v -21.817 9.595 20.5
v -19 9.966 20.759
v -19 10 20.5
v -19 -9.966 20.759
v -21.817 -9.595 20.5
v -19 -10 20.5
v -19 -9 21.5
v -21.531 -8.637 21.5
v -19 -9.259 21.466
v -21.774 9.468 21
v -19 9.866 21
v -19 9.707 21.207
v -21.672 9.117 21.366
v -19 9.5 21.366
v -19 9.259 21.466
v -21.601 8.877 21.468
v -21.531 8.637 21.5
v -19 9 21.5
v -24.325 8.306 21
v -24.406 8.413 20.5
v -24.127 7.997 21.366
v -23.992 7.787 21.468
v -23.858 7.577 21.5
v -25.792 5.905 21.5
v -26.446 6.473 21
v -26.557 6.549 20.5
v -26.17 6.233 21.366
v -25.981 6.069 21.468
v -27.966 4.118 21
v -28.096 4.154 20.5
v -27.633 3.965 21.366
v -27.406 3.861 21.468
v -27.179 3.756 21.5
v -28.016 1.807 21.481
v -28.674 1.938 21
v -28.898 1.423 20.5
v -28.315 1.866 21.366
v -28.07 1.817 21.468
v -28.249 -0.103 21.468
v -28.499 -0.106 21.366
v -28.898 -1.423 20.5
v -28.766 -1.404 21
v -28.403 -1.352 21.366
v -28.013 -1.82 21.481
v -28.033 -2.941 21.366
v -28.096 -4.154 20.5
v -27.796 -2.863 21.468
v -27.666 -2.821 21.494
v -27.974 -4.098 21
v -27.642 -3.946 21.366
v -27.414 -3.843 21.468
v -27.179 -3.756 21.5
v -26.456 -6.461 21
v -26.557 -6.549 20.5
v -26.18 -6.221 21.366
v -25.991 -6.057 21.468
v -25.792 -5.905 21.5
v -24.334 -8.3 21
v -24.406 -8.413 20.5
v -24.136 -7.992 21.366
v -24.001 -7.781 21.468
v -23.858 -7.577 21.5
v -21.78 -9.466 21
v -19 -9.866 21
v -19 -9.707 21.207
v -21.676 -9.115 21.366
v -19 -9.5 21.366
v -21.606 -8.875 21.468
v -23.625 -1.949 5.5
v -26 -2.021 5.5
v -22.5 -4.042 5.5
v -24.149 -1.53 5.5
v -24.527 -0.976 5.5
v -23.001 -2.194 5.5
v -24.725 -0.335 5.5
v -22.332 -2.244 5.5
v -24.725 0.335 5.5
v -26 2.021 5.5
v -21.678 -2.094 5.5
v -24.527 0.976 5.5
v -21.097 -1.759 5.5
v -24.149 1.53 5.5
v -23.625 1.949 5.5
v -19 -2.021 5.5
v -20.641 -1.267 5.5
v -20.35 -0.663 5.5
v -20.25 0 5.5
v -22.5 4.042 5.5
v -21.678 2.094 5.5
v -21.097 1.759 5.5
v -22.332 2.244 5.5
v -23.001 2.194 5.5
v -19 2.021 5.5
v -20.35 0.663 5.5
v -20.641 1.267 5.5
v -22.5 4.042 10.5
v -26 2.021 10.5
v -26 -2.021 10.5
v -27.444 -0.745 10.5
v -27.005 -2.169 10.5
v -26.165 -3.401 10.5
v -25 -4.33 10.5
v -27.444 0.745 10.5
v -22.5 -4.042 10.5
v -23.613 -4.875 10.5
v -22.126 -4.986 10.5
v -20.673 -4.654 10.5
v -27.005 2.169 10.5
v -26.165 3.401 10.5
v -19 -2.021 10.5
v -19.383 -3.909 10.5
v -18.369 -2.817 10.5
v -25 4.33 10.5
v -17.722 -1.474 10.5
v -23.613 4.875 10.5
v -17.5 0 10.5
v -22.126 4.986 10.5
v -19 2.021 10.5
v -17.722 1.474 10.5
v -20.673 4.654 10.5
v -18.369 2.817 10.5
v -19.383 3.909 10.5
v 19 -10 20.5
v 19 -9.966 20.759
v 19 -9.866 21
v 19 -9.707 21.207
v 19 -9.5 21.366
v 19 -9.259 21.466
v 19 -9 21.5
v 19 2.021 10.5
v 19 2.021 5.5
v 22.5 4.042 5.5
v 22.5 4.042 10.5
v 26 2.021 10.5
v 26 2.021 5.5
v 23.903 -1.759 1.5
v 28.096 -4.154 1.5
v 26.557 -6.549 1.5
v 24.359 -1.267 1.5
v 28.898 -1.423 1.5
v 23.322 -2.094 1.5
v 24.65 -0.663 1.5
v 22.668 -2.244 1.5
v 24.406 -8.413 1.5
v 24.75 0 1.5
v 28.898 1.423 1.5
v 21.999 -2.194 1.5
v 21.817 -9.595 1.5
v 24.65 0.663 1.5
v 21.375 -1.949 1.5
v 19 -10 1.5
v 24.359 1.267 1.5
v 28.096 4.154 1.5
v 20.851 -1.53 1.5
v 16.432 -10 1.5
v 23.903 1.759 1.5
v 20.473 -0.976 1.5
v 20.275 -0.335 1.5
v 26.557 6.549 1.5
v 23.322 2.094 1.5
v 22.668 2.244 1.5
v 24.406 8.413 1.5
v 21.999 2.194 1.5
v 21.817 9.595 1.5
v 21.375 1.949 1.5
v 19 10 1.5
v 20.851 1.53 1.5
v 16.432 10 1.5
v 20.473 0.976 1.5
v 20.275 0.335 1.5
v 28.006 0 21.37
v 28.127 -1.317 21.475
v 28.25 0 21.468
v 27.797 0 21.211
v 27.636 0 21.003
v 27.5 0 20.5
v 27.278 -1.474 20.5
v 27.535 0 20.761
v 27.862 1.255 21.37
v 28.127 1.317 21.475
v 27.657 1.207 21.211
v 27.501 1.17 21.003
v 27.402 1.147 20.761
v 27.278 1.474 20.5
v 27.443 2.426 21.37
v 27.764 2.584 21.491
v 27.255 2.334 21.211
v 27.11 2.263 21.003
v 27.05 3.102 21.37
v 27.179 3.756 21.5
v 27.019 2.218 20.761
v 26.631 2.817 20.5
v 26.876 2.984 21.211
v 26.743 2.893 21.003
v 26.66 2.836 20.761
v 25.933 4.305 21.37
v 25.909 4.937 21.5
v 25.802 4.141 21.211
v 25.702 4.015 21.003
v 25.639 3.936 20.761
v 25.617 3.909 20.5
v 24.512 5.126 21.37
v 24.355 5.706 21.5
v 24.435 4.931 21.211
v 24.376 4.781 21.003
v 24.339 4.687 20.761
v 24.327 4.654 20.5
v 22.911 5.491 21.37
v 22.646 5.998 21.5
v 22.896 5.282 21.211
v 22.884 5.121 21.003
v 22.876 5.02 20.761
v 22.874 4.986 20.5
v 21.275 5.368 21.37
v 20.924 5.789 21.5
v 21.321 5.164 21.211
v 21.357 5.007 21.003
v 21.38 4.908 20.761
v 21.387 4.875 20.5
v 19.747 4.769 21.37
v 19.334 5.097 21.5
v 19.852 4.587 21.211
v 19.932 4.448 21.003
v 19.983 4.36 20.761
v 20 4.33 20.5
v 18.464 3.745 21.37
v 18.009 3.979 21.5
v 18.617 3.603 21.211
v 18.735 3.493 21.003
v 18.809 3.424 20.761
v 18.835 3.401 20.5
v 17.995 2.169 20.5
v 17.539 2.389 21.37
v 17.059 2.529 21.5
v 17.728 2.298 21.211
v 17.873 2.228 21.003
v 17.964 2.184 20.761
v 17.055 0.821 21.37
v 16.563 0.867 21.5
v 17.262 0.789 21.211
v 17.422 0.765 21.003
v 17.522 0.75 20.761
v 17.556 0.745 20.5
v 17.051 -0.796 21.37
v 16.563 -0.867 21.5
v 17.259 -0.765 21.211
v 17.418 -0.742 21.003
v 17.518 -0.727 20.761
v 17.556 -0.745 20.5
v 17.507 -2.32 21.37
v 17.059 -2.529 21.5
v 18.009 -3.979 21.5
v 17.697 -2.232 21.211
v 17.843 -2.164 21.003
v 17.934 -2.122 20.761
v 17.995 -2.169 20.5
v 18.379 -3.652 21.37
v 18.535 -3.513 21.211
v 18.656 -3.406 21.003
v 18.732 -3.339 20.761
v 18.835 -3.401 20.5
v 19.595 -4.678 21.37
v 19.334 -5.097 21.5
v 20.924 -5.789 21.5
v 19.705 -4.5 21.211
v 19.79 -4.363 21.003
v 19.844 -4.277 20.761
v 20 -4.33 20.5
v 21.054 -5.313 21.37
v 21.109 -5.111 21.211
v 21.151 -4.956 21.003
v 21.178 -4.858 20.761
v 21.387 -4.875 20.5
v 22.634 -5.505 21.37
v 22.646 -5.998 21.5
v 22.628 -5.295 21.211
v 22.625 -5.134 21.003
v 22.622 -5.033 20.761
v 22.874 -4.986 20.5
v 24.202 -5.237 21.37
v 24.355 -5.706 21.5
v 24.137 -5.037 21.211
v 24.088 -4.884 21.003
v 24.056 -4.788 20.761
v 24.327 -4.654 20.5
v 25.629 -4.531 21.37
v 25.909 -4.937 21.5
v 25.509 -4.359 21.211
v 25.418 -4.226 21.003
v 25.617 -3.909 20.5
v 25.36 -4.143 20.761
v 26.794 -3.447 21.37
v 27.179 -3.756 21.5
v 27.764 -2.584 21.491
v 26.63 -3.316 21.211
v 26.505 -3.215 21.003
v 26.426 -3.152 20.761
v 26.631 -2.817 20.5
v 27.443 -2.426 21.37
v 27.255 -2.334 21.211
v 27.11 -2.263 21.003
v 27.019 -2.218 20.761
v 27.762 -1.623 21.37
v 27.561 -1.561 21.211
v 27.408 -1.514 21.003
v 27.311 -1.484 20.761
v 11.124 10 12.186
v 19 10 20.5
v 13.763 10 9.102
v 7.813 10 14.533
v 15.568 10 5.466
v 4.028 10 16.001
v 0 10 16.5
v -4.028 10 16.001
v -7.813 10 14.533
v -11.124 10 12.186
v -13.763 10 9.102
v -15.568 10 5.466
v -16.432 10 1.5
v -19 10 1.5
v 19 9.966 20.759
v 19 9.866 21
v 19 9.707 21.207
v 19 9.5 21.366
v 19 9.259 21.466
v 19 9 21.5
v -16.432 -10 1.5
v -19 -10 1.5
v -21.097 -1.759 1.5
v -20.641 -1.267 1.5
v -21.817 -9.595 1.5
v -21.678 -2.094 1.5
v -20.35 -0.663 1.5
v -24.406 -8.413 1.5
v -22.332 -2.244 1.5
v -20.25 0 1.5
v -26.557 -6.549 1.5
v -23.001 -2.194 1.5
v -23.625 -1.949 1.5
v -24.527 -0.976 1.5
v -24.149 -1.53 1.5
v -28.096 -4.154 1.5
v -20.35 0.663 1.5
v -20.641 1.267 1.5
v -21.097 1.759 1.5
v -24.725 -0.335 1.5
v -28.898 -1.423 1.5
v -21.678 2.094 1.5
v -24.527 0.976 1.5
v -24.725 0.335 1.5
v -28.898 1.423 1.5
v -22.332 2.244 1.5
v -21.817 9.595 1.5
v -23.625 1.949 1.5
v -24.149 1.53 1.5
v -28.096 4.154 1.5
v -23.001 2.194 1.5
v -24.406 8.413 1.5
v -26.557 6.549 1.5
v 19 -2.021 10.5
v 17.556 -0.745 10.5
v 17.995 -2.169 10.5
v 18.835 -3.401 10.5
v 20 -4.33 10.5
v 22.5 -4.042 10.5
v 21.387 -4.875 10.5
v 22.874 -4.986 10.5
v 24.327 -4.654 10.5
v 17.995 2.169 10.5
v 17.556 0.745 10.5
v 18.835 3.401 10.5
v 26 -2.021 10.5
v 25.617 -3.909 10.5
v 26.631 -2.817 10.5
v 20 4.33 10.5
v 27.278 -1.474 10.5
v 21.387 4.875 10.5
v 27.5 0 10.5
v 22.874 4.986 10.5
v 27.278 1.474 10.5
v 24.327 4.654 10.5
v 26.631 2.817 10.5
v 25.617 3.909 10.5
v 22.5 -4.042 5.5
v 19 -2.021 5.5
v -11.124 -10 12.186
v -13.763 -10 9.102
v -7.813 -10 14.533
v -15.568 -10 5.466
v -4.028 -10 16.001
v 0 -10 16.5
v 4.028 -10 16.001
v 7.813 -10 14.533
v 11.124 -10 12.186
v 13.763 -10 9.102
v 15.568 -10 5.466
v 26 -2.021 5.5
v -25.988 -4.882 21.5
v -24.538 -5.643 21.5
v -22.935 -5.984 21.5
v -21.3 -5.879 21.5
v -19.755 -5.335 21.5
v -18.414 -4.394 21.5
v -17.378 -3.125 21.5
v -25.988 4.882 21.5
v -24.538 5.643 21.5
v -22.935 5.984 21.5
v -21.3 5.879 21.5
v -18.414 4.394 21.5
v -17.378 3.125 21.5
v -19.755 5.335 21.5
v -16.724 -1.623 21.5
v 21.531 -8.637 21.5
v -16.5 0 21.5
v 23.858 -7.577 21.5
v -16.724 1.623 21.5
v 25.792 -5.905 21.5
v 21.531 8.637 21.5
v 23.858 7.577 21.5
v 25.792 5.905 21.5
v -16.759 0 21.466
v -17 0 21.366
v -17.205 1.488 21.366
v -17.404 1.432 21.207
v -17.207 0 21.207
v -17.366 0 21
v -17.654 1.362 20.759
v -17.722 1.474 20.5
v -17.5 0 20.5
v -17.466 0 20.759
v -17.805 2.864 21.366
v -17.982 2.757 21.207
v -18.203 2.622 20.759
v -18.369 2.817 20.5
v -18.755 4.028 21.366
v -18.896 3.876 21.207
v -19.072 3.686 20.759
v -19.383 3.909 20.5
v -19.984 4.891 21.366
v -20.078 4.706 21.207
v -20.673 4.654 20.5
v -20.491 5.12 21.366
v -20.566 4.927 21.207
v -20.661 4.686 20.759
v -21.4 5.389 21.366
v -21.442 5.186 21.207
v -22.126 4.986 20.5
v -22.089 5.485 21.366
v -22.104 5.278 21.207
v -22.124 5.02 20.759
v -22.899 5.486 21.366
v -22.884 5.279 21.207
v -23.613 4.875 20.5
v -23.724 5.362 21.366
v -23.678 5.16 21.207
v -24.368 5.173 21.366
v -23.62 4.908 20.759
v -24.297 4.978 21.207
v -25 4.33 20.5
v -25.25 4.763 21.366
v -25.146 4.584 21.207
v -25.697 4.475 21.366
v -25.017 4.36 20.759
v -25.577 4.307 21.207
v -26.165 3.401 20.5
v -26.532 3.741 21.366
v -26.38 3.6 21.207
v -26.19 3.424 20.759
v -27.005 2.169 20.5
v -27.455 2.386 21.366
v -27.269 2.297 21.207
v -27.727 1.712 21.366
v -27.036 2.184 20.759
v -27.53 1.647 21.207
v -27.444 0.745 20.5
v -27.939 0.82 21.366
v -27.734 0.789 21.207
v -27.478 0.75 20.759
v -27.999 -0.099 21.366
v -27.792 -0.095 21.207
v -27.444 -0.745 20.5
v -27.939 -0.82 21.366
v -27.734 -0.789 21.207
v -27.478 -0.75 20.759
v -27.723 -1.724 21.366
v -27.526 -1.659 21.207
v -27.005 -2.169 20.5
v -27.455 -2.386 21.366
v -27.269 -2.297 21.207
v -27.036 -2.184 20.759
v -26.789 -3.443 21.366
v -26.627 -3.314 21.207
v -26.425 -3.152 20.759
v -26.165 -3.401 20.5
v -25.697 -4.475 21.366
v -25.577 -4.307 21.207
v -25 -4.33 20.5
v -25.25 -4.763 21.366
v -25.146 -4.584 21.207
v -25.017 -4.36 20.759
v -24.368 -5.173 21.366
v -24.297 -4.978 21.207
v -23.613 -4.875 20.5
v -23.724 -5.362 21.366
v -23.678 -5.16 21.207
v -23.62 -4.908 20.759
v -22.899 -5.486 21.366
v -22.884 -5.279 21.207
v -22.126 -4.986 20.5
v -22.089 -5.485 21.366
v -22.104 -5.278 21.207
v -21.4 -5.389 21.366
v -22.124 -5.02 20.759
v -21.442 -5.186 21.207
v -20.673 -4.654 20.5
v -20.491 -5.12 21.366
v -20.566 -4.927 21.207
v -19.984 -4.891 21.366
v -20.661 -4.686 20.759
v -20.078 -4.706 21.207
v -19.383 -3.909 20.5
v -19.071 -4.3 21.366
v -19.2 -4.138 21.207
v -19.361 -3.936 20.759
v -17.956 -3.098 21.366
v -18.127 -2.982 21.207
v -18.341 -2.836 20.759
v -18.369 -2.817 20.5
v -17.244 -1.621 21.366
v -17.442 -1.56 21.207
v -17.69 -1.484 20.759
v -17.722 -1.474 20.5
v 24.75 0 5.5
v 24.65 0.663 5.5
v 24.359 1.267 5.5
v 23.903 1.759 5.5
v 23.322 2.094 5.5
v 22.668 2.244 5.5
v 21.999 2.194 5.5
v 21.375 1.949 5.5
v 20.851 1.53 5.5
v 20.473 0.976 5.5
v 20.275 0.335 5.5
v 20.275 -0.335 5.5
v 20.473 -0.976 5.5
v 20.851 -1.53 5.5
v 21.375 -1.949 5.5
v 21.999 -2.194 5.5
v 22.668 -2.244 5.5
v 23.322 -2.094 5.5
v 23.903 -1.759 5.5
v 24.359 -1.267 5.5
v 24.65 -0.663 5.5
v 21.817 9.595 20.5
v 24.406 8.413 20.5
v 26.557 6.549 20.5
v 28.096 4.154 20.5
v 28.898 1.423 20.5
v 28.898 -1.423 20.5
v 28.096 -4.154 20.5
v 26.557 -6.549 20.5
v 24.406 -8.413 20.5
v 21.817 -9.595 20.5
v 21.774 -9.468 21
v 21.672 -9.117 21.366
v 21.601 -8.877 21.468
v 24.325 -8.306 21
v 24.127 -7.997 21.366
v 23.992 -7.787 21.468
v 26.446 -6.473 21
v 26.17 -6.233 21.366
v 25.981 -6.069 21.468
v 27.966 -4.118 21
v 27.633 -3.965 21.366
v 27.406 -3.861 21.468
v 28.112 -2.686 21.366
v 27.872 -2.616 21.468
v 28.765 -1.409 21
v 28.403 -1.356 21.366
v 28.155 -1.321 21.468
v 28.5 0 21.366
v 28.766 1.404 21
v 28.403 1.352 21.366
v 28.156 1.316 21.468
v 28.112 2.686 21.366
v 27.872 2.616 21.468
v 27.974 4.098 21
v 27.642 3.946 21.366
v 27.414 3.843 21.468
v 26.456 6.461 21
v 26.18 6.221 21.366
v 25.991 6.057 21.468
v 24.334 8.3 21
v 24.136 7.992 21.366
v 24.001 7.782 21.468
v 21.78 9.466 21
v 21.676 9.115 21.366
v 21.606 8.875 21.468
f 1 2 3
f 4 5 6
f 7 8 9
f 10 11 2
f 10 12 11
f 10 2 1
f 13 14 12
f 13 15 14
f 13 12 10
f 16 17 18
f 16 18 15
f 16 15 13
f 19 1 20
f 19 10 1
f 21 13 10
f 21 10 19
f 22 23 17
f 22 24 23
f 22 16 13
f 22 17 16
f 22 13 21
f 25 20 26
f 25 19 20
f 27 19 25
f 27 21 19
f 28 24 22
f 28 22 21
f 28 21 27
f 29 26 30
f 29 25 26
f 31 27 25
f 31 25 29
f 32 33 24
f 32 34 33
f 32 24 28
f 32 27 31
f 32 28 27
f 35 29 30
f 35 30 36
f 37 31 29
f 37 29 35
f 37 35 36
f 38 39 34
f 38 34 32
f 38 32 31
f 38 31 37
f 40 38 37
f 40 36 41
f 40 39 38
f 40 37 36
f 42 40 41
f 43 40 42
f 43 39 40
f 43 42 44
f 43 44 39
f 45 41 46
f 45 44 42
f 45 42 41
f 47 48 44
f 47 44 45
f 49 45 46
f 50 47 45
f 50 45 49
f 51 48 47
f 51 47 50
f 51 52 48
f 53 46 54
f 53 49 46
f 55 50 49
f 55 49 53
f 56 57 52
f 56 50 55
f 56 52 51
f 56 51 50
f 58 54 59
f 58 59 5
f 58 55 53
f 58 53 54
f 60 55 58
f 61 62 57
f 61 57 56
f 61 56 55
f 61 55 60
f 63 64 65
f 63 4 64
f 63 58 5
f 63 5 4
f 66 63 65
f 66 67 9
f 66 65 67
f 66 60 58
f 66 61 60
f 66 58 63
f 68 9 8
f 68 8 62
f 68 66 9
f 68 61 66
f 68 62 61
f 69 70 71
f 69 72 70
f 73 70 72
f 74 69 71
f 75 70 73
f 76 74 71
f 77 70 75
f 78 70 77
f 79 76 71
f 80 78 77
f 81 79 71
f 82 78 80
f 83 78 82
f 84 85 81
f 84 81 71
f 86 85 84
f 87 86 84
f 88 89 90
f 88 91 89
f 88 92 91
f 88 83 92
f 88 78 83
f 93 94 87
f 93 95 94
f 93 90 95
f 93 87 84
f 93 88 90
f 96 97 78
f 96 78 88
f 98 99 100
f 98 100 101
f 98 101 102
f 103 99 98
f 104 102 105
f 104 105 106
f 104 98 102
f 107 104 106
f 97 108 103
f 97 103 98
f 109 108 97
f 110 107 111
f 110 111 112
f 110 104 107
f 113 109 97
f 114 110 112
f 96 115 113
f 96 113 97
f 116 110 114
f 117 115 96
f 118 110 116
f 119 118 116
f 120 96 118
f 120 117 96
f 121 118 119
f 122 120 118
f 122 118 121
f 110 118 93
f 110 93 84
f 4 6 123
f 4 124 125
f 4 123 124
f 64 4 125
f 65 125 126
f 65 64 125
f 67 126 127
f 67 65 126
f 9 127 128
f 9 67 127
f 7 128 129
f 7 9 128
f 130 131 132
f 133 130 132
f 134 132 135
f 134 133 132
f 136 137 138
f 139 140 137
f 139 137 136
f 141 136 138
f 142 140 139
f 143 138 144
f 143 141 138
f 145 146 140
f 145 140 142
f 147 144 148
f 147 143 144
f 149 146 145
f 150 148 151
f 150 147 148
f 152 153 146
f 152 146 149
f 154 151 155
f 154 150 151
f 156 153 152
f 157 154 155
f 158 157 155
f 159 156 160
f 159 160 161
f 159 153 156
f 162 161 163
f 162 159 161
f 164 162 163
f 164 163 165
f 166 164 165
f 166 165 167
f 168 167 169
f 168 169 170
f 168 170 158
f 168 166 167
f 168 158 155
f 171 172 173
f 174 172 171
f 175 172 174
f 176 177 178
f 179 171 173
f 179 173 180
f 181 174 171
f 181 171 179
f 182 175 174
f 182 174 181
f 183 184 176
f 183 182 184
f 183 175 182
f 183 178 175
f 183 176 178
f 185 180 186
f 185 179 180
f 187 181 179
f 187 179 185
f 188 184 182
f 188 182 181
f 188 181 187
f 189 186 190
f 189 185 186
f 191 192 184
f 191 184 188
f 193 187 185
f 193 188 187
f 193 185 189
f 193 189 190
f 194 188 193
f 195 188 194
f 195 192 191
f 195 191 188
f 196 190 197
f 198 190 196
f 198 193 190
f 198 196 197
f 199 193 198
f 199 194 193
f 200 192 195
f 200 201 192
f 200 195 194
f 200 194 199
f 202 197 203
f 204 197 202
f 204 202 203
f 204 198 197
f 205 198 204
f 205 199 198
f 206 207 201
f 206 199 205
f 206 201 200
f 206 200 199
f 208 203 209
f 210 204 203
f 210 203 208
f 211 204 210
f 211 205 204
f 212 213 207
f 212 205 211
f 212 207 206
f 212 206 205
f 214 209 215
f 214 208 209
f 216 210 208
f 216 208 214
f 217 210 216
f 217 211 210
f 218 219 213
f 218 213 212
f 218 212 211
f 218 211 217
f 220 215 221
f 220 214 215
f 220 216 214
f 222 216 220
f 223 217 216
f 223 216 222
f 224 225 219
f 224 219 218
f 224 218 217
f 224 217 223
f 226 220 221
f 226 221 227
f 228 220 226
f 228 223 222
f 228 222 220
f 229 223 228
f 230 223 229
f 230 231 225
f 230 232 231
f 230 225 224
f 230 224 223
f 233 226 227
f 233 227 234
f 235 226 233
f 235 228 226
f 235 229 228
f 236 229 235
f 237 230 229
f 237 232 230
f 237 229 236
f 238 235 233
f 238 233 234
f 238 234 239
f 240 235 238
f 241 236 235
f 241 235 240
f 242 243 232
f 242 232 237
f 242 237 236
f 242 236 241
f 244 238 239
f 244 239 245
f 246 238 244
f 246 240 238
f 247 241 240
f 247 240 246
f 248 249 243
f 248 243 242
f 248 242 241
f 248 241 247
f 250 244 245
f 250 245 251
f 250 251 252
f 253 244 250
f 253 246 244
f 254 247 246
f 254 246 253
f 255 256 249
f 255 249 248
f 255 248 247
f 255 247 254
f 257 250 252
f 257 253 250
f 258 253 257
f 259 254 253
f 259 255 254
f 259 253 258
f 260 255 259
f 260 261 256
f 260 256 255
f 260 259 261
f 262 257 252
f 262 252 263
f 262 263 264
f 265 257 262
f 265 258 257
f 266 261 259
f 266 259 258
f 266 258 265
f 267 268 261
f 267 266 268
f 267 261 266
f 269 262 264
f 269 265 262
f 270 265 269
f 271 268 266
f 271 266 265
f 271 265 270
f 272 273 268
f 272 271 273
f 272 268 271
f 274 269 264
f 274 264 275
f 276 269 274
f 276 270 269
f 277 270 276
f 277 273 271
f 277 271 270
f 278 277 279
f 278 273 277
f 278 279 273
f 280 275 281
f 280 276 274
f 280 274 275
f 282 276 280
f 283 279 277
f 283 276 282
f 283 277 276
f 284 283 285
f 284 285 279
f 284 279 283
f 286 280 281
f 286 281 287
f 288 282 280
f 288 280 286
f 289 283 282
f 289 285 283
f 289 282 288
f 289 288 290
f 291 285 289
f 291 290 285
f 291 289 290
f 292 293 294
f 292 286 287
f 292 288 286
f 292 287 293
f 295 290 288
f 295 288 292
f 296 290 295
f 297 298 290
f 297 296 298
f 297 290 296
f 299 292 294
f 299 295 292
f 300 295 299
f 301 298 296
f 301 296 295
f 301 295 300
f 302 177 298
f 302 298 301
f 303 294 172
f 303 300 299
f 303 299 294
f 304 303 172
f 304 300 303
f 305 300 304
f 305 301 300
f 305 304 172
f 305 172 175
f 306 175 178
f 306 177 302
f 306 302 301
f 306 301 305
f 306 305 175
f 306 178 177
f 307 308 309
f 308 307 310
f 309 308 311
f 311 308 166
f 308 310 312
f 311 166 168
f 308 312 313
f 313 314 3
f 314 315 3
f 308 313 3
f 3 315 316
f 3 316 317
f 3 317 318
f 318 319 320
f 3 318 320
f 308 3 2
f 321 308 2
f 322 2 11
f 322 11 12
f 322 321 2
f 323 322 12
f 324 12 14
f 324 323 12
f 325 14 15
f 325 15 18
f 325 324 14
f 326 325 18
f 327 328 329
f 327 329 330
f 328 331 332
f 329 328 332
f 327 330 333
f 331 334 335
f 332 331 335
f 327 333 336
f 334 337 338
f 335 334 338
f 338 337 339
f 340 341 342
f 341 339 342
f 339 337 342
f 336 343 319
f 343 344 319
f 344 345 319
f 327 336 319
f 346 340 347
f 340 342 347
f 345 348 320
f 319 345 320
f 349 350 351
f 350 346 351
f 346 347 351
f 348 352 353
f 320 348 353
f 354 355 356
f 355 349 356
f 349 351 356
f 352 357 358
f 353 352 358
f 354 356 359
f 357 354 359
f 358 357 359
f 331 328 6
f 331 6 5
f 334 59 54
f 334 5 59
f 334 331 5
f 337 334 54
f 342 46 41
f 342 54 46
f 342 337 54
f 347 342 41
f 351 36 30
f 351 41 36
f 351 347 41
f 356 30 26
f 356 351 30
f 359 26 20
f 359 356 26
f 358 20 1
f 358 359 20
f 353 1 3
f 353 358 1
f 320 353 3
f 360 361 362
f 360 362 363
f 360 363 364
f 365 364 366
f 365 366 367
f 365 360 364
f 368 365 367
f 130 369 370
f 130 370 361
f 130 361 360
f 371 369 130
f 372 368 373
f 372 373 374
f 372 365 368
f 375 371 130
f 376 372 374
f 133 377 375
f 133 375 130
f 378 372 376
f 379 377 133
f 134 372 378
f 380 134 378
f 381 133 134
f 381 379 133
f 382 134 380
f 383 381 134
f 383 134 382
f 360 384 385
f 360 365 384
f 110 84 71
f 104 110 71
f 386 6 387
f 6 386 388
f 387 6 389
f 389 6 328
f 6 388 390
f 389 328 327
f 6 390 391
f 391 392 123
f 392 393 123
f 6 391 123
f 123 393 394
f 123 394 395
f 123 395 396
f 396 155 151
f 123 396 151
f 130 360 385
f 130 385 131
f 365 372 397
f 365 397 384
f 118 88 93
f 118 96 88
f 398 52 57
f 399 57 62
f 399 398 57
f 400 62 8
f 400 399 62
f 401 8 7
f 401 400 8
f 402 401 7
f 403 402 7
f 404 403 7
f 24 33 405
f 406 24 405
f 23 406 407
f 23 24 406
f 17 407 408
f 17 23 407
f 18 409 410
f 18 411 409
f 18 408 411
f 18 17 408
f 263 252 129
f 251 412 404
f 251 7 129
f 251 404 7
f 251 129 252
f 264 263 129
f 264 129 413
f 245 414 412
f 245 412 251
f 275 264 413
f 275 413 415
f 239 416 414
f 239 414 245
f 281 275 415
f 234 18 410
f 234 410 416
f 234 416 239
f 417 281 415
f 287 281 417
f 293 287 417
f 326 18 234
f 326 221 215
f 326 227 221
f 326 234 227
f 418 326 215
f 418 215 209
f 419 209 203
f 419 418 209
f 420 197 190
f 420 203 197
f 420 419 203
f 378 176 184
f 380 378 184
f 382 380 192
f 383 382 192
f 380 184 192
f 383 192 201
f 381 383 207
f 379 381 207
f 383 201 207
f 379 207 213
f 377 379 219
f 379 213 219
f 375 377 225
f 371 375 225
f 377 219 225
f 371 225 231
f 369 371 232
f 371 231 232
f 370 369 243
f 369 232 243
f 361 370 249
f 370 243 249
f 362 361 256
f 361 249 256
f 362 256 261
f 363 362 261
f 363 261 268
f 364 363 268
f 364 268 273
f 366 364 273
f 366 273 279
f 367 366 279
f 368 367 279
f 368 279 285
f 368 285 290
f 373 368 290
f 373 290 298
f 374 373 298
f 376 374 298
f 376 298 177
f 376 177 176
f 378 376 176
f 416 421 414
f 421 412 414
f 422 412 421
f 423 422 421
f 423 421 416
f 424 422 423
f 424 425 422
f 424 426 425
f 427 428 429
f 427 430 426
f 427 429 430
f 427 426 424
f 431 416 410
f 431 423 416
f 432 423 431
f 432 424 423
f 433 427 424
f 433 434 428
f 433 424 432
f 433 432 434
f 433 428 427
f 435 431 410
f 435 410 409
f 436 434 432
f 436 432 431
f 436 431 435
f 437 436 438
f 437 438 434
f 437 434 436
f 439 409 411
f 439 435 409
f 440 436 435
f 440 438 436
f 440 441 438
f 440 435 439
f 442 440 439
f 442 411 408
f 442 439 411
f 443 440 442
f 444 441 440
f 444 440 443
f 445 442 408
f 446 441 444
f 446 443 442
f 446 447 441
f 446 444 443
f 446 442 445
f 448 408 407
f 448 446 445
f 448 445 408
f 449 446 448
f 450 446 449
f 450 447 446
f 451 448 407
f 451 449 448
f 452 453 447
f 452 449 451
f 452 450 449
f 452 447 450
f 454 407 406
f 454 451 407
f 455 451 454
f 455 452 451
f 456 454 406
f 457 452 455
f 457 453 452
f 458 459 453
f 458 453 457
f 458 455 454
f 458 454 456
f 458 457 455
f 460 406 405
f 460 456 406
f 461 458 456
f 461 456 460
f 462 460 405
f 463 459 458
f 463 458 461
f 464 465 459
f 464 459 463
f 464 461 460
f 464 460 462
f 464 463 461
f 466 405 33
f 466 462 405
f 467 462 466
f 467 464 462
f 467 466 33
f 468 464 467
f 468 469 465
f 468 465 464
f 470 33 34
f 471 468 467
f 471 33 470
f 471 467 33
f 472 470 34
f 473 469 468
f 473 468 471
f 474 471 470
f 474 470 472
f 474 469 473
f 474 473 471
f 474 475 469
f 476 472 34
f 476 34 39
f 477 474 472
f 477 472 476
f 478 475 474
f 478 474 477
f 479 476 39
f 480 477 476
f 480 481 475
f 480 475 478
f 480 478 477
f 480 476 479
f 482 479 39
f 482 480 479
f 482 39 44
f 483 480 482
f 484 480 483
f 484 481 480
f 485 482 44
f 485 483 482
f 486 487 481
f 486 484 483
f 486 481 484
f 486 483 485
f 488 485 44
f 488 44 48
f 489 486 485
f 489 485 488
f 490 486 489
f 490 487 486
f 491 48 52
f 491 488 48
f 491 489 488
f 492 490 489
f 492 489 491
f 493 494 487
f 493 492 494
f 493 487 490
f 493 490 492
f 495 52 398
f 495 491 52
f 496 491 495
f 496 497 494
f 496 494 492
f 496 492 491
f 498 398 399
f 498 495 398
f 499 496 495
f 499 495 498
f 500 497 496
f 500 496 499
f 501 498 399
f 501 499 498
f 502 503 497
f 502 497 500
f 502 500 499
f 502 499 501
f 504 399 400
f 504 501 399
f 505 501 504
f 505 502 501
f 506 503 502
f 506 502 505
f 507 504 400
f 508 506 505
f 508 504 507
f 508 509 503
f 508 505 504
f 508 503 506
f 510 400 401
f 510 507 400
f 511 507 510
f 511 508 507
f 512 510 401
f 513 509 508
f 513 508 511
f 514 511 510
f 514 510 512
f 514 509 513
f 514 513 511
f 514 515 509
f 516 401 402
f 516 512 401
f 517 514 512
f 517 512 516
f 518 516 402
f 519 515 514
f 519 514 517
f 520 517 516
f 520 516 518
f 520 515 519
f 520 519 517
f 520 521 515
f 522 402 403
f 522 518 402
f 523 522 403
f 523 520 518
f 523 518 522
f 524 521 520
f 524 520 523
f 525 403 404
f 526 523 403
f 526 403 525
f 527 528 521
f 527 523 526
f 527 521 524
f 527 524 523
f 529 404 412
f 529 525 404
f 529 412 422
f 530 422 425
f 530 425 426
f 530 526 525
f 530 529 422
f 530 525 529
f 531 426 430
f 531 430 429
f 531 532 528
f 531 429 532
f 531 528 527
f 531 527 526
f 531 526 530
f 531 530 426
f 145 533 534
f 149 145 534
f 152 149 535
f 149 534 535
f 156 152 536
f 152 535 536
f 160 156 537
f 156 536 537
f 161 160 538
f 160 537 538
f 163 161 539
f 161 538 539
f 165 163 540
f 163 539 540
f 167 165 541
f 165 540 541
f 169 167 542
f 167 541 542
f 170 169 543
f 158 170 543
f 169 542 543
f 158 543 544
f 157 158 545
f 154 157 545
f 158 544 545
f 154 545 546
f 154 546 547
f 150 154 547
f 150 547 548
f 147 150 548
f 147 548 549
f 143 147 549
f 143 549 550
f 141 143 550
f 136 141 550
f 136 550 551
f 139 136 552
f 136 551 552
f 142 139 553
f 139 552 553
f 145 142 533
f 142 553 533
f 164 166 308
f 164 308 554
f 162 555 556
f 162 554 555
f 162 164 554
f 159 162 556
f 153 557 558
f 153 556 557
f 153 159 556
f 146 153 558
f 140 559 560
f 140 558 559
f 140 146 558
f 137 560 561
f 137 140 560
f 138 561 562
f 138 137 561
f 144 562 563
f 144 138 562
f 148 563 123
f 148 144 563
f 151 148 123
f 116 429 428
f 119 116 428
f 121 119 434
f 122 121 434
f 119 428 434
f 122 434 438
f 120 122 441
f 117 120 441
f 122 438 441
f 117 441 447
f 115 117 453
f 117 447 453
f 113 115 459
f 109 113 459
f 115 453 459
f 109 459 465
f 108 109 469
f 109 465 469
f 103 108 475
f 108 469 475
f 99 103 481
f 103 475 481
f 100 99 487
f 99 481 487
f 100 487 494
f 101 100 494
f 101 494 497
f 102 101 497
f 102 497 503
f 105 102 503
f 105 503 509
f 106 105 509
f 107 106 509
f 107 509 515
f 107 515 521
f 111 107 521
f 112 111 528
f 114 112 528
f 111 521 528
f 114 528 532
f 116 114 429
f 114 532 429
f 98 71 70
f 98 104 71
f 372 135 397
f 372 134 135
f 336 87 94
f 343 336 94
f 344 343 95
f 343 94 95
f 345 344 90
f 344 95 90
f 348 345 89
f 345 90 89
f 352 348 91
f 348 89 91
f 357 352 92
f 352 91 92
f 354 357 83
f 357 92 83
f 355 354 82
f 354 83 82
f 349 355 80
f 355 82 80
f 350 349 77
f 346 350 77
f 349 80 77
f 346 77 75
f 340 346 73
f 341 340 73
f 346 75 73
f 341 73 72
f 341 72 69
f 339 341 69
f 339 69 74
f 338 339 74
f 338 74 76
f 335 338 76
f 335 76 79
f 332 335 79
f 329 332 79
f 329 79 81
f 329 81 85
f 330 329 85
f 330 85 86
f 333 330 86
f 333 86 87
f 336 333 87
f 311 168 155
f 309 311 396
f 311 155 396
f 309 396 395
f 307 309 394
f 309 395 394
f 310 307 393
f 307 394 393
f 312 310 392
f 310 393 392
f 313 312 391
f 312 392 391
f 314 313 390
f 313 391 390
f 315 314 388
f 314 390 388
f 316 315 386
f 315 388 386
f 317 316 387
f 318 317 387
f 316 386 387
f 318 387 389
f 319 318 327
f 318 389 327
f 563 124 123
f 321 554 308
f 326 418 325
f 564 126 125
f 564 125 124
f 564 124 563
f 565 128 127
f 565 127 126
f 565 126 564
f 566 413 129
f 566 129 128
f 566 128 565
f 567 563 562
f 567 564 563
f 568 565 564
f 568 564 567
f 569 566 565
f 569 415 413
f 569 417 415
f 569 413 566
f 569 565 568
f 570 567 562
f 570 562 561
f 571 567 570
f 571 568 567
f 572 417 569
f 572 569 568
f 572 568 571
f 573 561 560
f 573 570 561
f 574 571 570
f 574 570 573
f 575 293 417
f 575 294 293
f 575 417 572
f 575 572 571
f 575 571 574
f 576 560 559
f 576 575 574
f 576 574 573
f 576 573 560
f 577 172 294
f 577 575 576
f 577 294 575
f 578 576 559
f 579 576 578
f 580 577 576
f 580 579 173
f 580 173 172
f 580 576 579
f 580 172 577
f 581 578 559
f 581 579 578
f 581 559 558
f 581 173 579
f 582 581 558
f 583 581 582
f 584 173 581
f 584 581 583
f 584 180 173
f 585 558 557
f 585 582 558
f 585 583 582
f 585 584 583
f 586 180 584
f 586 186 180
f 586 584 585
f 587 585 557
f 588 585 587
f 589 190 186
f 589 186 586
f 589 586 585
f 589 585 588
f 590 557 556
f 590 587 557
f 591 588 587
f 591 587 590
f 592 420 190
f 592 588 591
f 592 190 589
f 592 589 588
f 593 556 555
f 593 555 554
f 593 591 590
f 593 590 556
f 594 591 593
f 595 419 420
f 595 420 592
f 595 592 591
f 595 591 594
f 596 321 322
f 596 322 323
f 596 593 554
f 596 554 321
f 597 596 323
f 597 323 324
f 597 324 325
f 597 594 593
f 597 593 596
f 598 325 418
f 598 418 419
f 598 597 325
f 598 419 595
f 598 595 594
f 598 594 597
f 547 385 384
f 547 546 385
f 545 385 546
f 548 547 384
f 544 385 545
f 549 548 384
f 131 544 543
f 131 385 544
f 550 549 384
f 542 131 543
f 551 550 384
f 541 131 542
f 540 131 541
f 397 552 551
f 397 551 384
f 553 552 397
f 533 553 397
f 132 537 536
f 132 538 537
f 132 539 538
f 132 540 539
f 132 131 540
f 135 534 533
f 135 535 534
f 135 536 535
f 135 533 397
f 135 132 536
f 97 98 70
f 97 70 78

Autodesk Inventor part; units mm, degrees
ref_plane "YZ Plane" through (0, 0, 0) normal (1, 0, 0) x (0, 1, 0)
ref_plane "XZ Plane" through (0, 0, 0) normal (0, 1, 0) x (-1, 0, 0)
ref_plane "XY Plane" through (0, 0, 0) normal (0, 0, 1) x (1, 0, 0)
sketch "Sketch1" plane through (0, 0, 0) normal (0, 0, 1) x (1, 0, 0)
  line L0 (19, 10) -> (-19, 10) projected
  arc A0 (19, -10) -> (19, 10) centre (19, 0) ccw projected
  line L1 (-19, -10) -> (19, -10) projected
  arc A1 (-19, 10) -> (-19, -10) centre (-19, 0) ccw projected
  circle A2 centre (22.5, 0) radius 2.25 projected
  circle A3 centre (-22.5, 0) radius 2.25 projected
  point P0 (0, 0)
extrude "Extrusion1" add sketch "Sketch1" along normal blind 20 contours A0 L1 A1 L0 | A2 | A3
sketch "Sketch2" plane through (-19, -10, 0) normal (0, -1, 0) x (1, 0, 0)
  arc A0 (3, 0) -> (35, 0) centre (19, 0) ccw projected
  line L0 (3, 0) -> (0, 0) projected
  line L1 (0, -40) -> (0, 0) projected
  line L2 (0, -40) -> (38, -40) projected
  line L3 (38, -40) -> (38, 0) projected
  line L4 (38, 0) -> (35, 0) projected
  circle A1 centre (19, 0) radius 16
  line L5 (0, 0) -> (38, 0) projected
  line L6 (38, 0) -> (38, 20) projected
  line L7 (0, 20) -> (38, 20) projected
  line L8 (0, 0) -> (0, 20) projected
  point P0 (19, 0)
  point P1 (3, 0)
  point P2 (35, 0)
extrude "Extrusion2" cut sketch "Sketch2" against normal through all contours A1 L5
sketch "Sketch3" plane through (0, 0, 20) normal (0, 0, 1) x (1, 0, 0)
  arc A0 (-19, 10) -> (-19, -10) centre (-19, 0) ccw projected
  line L0 (-19, -10) -> (19, -10) projected
  arc A1 (19, -10) -> (19, 10) centre (19, 0) ccw projected
  line L1 (19, 10) -> (-19, 10) projected
  line L2 (-16, -10.4231) -> (-16, -76.7035)
  arc A2 (-19, 10) -> (-19, -10) centre (-19, 0) ccw projected
  line L3 (-29, 0) -> (-16, 0)
  circle A3 centre (-22.5, 0) radius 2.25
  line L4 (19, 10) -> (-19, 10) projected
  line L5 (0, 10) -> (0, -10)
  circle A4 centre (22.5, 0) radius 2.25
  line L6 (-22.5, 0) -> (-26, 0)
  line L7 (-26, 2.0207) -> (-22.5, 4.0415)
  line L8 (-22.5, 4.0415) -> (-19, 2.0207)
  line L9 (-19, 2.0207) -> (-19, -2.0207)
  line L10 (-19, -2.0207) -> (-22.5, -4.0415)
  line L11 (-22.5, -4.0415) -> (-26, -2.0207)
  line L12 (-26, -2.0207) -> (-26, 2.0207)
  line L13 (26, 2.0207) -> (22.5, 4.0415)
  line L14 (22.5, 4.0415) -> (19, 2.0207)
  line L15 (19, 2.0207) -> (19, -2.0207)
  line L16 (19, -2.0207) -> (22.5, -4.0415)
  line L17 (22.5, -4.0415) -> (26, -2.0207)
  line L18 (26, -2.0207) -> (26, 2.0207)
  point P0 (0, 0)
  dimension "d4" = 4.5
  dimension "d5" = 3.5
extrude "Extrusion3" [suppressed]
extrude "Extrusion4" cut sketch "Sketch3" against normal blind 5.5 contours L3 A3 | L3 A3 | A3 L3 L12 L7 L8 L9 | L3 L9 L10 L11 L12 A3 | A4 | L18 L17 L16 L15 L14 L13
extrude "Extrusion5" cut sketch "Sketch3" against normal through all contours L3 A3 | L3 A3 | A4
sketch "Sketch4" plane through (0, 0, 20) normal (0, 0, 1) x (1, 0, 0)
  line L0 (19, 2.0207) -> (22.5, 4.0415) projected
  line L1 (22.5, 4.0415) -> (26, 2.0207) projected
  line L2 (26, 2.0207) -> (26, -2.0207) projected
  line L3 (26, -2.0207) -> (22.5, -4.0415) projected
  line L4 (22.5, -4.0415) -> (19, -2.0207) projected
  line L5 (19, -2.0207) -> (19, 2.0207) projected
  line L6 (-19, -2.0207) -> (-22.5, -4.0415) projected
  line L7 (-22.5, -4.0415) -> (-26, -2.0207) projected
  line L8 (-26, -2.0207) -> (-26, 2.0207) projected
  line L9 (-26, 2.0207) -> (-22.5, 4.0415) projected
  line L10 (-22.5, 4.0415) -> (-19, 2.0207) projected
  line L11 (-19, 2.0207) -> (-19, -2.0207) projected
  arc A0 (-19, 10) -> (-19, -10) centre (-19, 0) ccw projected
  line L12 (-19, -10) -> (19, -10) projected
  arc A1 (19, -10) -> (19, 10) centre (19, 0) ccw projected
  line L13 (19, 10) -> (-19, 10) projected
  point P0 (0, 0)
extrude "Extrusion6" add sketch "Sketch4" along normal blind 1.5
sketch "Sketch5" plane through (0, 0, 0) normal (0, 0, -1) x (-1, 0, 0)
  circle A0 centre (-22.5, 0) radius 2.25 projected
  line L0 (-16, -10) -> (-16, 10) projected
  line L1 (-19, 10) -> (-16, 10) projected
  arc A1 (-19, 10) -> (-19, -10) centre (-19, 0) ccw projected
  line L2 (-16, -10) -> (-19, -10) projected
  circle A2 centre (22.5, 0) radius 2.25 projected
  line L3 (16, 10) -> (16, -10) projected
  line L4 (19, -10) -> (16, -10) projected
  arc A3 (19, -10) -> (19, 10) centre (19, 0) ccw projected
  line L5 (16, 10) -> (19, 10) projected
  point P0 (0, 0)
extrude "Extrusion7" cut sketch "Sketch5" against normal blind 0.5
sketch "Sketch6" plane through (0, -10, 0) normal (0, -1, 0) x (1, 0, 0)
  line L0 (-19, 0.5) -> (-19, 21.5) projected
  line L1 (-19, 0.5) -> (-16, 0.5) projected
  line L2 (-16, 0.5) -> (-16, 0) projected
  arc A0 (16, 0) -> (-16, 0) centre (0, 0) ccw projected
  line L3 (16, 0) -> (16, 0.5) projected
  line L4 (16, 0.5) -> (19, 0.5) projected
  line L5 (19, 0.5) -> (19, 21.5) projected
  arc A1 (16, 0) -> (-16, 0) centre (0, 0) ccw projected
  line L6 (0, 16) -> (0, 16.5)
  circle A2 centre (0, 0) radius 16.5
  line L7 (-19, 21.5) -> (19, 21.5) projected
  point P0 (0, 0)
  point P1 (16.4924, 0.5)
  point P2 (-16.4924, 0.5)
  dimension "d17" = 0.5
extrude "Extrusion8" cut sketch "Sketch6" against normal through all contours A2 L6 A0 L2 L1 | A2 L4 L3 A0 L6
sketch "Sketch7" plane through (0, 0, 21.5) normal (0, 0, 1) x (1, 0, 0)
  circle A0 centre (-22.5, 0) radius 2.25 projected
  line L0 (-22.5, -4.0415) -> (-26, -2.0207) projected
  line L1 (-19, -2.0207) -> (-22.5, -4.0415) projected
  line L2 (-19, 2.0207) -> (-19, -2.0207) projected
  line L3 (-22.5, 4.0415) -> (-19, 2.0207) projected
  line L4 (-26, 2.0207) -> (-22.5, 4.0415) projected
  line L5 (-26, -2.0207) -> (-26, 2.0207) projected
  circle A1 centre (22.5, 0) radius 2.25 projected
  line L6 (22.5, 4.0415) -> (26, 2.0207) projected
  line L7 (19, 2.0207) -> (22.5, 4.0415) projected
  line L8 (19, -2.0207) -> (19, 2.0207) projected
  line L9 (22.5, -4.0415) -> (19, -2.0207) projected
  line L10 (26, -2.0207) -> (22.5, -4.0415) projected
  line L11 (26, 2.0207) -> (26, -2.0207) projected
  point P0 (0, 0)
extrude "Extrusion9" cut sketch "Sketch7" against normal blind 15
sketch "Sketch8" plane through (0, 0, 21.5) normal (0, 0, 1) x (1, 0, 0)
  line L0 (-19, -10) -> (19, -10) projected
  arc A0 (19, -10) -> (19, 10) centre (19, 0) ccw projected
  line L1 (19, 10) -> (-19, 10) projected
  arc A1 (-19, 10) -> (-19, -10) centre (-19, 0) ccw projected
  line L2 (-19, -2.0207) -> (-22.5, -4.0415) projected
  line L3 (-22.5, -4.0415) -> (-26, -2.0207) projected
  line L4 (-26, -2.0207) -> (-26, 2.0207) projected
  line L5 (-26, 2.0207) -> (-22.5, 4.0415) projected
  line L6 (-22.5, 4.0415) -> (-19, 2.0207) projected
  line L7 (-19, 2.0207) -> (-19, -2.0207) projected
  line L8 (19, 2.0207) -> (22.5, 4.0415) projected
  line L9 (22.5, 4.0415) -> (26, 2.0207) projected
  line L10 (26, 2.0207) -> (26, -2.0207) projected
  line L11 (26, -2.0207) -> (22.5, -4.0415) projected
  line L12 (22.5, -4.0415) -> (19, -2.0207) projected
  line L13 (19, -2.0207) -> (19, 2.0207) projected
  circle A2 centre (-22.5, 0) radius 2.25 projected
  circle A3 centre (22.5, 0) radius 2.25 projected
  circle A4 centre (-22.5, 0) radius 5
  circle A5 centre (22.5, 0) radius 5
  point P0 (0, 0)
  dimension "d22" = 10
  dimension "d23" = 10
extrude "Extrusion10" cut sketch "Sketch8" against normal blind 11 contours L2 L3 L4 L5 L6 L7 | L8 L9 L10 L11 L12 L13 | A2 | A3 | A4 | A5
fillet "Fillet2" radius 1 6 edges at (0, -10, 21.5) (29, 0, 21.5) (0, 10, 21.5) (-29, 0, 21.5) (-27.5, 0, 21.5) (17.5, 0, 21.5)
sketch "Szkic9" plane through (0, 0, 6.5) normal (0, 0, 1) x (1, 0, 0)
  line L0 (-19, 2.0207) -> (-19, -2.0207) projected
  line L1 (-22.5, 4.0415) -> (-19, 2.0207) projected
  line L2 (-26, 2.0207) -> (-22.5, 4.0415) projected
  line L3 (-26, -2.0207) -> (-26, 2.0207) projected
  line L4 (-22.5, -4.0415) -> (-26, -2.0207) projected
  line L5 (-19, -2.0207) -> (-22.5, -4.0415) projected
  circle A0 centre (-22.5, 0) radius 2.25 projected
  line L6 (19, -2.0207) -> (19, 2.0207) projected
  line L7 (22.5, -4.0415) -> (19, -2.0207) projected
  line L8 (26, -2.0207) -> (22.5, -4.0415) projected
  line L9 (26, 2.0207) -> (26, -2.0207) projected
  line L10 (22.5, 4.0415) -> (26, 2.0207) projected
  line L11 (19, 2.0207) -> (22.5, 4.0415) projected
  circle A1 centre (22.5, 0) radius 2.25 projected
  point P0 (0, 0)
extrude "Wyciągnięcie proste11" cut sketch "Szkic9" against normal blind 1
sketch "Szkic10" plane through (0, 0, 0.5) normal (0, 0, -1) x (-1, 0, 0)
  line L0 (-16.4924, -10) -> (-16.4924, 10) projected
  line L1 (-19, 10) -> (-16.4924, 10) projected
  arc A0 (-19, 10) -> (-19, -10) centre (-19, 0) ccw projected
  line L2 (-16.4924, -10) -> (-19, -10) projected
  circle A1 centre (-22.5, 0) radius 2.25 projected
  circle A2 centre (22.5, 0) radius 2.25 projected
  line L3 (16.4924, 10) -> (16.4924, -10) projected
  line L4 (19, -10) -> (16.4924, -10) projected
  arc A3 (19, -10) -> (19, 10) centre (19, 0) ccw projected
  line L5 (16.4924, 10) -> (19, 10) projected
  point P0 (0, 0)
extrude "Wyciągnięcie proste12" cut sketch "Szkic10" against normal blind 1
sketch "Szkic11" plane through (-16.4924, -10, 0.5) normal (-1, 0, 0) x (0, 0, 1)
  line L0 (0, 20) -> (0, 0) projected
  line L1 (1, 0) -> (0, 0) projected
  line L2 (1, 0) -> (1, 20) projected
  line L3 (0, 20) -> (1, 20) projected
  point P0 (-0.5, 10)
extrude "Wyciągnięcie proste13" cut sketch "Szkic11" against normal through all
properties part number "Uchwyt_silnika_2_dół" material "Kauczuk"
